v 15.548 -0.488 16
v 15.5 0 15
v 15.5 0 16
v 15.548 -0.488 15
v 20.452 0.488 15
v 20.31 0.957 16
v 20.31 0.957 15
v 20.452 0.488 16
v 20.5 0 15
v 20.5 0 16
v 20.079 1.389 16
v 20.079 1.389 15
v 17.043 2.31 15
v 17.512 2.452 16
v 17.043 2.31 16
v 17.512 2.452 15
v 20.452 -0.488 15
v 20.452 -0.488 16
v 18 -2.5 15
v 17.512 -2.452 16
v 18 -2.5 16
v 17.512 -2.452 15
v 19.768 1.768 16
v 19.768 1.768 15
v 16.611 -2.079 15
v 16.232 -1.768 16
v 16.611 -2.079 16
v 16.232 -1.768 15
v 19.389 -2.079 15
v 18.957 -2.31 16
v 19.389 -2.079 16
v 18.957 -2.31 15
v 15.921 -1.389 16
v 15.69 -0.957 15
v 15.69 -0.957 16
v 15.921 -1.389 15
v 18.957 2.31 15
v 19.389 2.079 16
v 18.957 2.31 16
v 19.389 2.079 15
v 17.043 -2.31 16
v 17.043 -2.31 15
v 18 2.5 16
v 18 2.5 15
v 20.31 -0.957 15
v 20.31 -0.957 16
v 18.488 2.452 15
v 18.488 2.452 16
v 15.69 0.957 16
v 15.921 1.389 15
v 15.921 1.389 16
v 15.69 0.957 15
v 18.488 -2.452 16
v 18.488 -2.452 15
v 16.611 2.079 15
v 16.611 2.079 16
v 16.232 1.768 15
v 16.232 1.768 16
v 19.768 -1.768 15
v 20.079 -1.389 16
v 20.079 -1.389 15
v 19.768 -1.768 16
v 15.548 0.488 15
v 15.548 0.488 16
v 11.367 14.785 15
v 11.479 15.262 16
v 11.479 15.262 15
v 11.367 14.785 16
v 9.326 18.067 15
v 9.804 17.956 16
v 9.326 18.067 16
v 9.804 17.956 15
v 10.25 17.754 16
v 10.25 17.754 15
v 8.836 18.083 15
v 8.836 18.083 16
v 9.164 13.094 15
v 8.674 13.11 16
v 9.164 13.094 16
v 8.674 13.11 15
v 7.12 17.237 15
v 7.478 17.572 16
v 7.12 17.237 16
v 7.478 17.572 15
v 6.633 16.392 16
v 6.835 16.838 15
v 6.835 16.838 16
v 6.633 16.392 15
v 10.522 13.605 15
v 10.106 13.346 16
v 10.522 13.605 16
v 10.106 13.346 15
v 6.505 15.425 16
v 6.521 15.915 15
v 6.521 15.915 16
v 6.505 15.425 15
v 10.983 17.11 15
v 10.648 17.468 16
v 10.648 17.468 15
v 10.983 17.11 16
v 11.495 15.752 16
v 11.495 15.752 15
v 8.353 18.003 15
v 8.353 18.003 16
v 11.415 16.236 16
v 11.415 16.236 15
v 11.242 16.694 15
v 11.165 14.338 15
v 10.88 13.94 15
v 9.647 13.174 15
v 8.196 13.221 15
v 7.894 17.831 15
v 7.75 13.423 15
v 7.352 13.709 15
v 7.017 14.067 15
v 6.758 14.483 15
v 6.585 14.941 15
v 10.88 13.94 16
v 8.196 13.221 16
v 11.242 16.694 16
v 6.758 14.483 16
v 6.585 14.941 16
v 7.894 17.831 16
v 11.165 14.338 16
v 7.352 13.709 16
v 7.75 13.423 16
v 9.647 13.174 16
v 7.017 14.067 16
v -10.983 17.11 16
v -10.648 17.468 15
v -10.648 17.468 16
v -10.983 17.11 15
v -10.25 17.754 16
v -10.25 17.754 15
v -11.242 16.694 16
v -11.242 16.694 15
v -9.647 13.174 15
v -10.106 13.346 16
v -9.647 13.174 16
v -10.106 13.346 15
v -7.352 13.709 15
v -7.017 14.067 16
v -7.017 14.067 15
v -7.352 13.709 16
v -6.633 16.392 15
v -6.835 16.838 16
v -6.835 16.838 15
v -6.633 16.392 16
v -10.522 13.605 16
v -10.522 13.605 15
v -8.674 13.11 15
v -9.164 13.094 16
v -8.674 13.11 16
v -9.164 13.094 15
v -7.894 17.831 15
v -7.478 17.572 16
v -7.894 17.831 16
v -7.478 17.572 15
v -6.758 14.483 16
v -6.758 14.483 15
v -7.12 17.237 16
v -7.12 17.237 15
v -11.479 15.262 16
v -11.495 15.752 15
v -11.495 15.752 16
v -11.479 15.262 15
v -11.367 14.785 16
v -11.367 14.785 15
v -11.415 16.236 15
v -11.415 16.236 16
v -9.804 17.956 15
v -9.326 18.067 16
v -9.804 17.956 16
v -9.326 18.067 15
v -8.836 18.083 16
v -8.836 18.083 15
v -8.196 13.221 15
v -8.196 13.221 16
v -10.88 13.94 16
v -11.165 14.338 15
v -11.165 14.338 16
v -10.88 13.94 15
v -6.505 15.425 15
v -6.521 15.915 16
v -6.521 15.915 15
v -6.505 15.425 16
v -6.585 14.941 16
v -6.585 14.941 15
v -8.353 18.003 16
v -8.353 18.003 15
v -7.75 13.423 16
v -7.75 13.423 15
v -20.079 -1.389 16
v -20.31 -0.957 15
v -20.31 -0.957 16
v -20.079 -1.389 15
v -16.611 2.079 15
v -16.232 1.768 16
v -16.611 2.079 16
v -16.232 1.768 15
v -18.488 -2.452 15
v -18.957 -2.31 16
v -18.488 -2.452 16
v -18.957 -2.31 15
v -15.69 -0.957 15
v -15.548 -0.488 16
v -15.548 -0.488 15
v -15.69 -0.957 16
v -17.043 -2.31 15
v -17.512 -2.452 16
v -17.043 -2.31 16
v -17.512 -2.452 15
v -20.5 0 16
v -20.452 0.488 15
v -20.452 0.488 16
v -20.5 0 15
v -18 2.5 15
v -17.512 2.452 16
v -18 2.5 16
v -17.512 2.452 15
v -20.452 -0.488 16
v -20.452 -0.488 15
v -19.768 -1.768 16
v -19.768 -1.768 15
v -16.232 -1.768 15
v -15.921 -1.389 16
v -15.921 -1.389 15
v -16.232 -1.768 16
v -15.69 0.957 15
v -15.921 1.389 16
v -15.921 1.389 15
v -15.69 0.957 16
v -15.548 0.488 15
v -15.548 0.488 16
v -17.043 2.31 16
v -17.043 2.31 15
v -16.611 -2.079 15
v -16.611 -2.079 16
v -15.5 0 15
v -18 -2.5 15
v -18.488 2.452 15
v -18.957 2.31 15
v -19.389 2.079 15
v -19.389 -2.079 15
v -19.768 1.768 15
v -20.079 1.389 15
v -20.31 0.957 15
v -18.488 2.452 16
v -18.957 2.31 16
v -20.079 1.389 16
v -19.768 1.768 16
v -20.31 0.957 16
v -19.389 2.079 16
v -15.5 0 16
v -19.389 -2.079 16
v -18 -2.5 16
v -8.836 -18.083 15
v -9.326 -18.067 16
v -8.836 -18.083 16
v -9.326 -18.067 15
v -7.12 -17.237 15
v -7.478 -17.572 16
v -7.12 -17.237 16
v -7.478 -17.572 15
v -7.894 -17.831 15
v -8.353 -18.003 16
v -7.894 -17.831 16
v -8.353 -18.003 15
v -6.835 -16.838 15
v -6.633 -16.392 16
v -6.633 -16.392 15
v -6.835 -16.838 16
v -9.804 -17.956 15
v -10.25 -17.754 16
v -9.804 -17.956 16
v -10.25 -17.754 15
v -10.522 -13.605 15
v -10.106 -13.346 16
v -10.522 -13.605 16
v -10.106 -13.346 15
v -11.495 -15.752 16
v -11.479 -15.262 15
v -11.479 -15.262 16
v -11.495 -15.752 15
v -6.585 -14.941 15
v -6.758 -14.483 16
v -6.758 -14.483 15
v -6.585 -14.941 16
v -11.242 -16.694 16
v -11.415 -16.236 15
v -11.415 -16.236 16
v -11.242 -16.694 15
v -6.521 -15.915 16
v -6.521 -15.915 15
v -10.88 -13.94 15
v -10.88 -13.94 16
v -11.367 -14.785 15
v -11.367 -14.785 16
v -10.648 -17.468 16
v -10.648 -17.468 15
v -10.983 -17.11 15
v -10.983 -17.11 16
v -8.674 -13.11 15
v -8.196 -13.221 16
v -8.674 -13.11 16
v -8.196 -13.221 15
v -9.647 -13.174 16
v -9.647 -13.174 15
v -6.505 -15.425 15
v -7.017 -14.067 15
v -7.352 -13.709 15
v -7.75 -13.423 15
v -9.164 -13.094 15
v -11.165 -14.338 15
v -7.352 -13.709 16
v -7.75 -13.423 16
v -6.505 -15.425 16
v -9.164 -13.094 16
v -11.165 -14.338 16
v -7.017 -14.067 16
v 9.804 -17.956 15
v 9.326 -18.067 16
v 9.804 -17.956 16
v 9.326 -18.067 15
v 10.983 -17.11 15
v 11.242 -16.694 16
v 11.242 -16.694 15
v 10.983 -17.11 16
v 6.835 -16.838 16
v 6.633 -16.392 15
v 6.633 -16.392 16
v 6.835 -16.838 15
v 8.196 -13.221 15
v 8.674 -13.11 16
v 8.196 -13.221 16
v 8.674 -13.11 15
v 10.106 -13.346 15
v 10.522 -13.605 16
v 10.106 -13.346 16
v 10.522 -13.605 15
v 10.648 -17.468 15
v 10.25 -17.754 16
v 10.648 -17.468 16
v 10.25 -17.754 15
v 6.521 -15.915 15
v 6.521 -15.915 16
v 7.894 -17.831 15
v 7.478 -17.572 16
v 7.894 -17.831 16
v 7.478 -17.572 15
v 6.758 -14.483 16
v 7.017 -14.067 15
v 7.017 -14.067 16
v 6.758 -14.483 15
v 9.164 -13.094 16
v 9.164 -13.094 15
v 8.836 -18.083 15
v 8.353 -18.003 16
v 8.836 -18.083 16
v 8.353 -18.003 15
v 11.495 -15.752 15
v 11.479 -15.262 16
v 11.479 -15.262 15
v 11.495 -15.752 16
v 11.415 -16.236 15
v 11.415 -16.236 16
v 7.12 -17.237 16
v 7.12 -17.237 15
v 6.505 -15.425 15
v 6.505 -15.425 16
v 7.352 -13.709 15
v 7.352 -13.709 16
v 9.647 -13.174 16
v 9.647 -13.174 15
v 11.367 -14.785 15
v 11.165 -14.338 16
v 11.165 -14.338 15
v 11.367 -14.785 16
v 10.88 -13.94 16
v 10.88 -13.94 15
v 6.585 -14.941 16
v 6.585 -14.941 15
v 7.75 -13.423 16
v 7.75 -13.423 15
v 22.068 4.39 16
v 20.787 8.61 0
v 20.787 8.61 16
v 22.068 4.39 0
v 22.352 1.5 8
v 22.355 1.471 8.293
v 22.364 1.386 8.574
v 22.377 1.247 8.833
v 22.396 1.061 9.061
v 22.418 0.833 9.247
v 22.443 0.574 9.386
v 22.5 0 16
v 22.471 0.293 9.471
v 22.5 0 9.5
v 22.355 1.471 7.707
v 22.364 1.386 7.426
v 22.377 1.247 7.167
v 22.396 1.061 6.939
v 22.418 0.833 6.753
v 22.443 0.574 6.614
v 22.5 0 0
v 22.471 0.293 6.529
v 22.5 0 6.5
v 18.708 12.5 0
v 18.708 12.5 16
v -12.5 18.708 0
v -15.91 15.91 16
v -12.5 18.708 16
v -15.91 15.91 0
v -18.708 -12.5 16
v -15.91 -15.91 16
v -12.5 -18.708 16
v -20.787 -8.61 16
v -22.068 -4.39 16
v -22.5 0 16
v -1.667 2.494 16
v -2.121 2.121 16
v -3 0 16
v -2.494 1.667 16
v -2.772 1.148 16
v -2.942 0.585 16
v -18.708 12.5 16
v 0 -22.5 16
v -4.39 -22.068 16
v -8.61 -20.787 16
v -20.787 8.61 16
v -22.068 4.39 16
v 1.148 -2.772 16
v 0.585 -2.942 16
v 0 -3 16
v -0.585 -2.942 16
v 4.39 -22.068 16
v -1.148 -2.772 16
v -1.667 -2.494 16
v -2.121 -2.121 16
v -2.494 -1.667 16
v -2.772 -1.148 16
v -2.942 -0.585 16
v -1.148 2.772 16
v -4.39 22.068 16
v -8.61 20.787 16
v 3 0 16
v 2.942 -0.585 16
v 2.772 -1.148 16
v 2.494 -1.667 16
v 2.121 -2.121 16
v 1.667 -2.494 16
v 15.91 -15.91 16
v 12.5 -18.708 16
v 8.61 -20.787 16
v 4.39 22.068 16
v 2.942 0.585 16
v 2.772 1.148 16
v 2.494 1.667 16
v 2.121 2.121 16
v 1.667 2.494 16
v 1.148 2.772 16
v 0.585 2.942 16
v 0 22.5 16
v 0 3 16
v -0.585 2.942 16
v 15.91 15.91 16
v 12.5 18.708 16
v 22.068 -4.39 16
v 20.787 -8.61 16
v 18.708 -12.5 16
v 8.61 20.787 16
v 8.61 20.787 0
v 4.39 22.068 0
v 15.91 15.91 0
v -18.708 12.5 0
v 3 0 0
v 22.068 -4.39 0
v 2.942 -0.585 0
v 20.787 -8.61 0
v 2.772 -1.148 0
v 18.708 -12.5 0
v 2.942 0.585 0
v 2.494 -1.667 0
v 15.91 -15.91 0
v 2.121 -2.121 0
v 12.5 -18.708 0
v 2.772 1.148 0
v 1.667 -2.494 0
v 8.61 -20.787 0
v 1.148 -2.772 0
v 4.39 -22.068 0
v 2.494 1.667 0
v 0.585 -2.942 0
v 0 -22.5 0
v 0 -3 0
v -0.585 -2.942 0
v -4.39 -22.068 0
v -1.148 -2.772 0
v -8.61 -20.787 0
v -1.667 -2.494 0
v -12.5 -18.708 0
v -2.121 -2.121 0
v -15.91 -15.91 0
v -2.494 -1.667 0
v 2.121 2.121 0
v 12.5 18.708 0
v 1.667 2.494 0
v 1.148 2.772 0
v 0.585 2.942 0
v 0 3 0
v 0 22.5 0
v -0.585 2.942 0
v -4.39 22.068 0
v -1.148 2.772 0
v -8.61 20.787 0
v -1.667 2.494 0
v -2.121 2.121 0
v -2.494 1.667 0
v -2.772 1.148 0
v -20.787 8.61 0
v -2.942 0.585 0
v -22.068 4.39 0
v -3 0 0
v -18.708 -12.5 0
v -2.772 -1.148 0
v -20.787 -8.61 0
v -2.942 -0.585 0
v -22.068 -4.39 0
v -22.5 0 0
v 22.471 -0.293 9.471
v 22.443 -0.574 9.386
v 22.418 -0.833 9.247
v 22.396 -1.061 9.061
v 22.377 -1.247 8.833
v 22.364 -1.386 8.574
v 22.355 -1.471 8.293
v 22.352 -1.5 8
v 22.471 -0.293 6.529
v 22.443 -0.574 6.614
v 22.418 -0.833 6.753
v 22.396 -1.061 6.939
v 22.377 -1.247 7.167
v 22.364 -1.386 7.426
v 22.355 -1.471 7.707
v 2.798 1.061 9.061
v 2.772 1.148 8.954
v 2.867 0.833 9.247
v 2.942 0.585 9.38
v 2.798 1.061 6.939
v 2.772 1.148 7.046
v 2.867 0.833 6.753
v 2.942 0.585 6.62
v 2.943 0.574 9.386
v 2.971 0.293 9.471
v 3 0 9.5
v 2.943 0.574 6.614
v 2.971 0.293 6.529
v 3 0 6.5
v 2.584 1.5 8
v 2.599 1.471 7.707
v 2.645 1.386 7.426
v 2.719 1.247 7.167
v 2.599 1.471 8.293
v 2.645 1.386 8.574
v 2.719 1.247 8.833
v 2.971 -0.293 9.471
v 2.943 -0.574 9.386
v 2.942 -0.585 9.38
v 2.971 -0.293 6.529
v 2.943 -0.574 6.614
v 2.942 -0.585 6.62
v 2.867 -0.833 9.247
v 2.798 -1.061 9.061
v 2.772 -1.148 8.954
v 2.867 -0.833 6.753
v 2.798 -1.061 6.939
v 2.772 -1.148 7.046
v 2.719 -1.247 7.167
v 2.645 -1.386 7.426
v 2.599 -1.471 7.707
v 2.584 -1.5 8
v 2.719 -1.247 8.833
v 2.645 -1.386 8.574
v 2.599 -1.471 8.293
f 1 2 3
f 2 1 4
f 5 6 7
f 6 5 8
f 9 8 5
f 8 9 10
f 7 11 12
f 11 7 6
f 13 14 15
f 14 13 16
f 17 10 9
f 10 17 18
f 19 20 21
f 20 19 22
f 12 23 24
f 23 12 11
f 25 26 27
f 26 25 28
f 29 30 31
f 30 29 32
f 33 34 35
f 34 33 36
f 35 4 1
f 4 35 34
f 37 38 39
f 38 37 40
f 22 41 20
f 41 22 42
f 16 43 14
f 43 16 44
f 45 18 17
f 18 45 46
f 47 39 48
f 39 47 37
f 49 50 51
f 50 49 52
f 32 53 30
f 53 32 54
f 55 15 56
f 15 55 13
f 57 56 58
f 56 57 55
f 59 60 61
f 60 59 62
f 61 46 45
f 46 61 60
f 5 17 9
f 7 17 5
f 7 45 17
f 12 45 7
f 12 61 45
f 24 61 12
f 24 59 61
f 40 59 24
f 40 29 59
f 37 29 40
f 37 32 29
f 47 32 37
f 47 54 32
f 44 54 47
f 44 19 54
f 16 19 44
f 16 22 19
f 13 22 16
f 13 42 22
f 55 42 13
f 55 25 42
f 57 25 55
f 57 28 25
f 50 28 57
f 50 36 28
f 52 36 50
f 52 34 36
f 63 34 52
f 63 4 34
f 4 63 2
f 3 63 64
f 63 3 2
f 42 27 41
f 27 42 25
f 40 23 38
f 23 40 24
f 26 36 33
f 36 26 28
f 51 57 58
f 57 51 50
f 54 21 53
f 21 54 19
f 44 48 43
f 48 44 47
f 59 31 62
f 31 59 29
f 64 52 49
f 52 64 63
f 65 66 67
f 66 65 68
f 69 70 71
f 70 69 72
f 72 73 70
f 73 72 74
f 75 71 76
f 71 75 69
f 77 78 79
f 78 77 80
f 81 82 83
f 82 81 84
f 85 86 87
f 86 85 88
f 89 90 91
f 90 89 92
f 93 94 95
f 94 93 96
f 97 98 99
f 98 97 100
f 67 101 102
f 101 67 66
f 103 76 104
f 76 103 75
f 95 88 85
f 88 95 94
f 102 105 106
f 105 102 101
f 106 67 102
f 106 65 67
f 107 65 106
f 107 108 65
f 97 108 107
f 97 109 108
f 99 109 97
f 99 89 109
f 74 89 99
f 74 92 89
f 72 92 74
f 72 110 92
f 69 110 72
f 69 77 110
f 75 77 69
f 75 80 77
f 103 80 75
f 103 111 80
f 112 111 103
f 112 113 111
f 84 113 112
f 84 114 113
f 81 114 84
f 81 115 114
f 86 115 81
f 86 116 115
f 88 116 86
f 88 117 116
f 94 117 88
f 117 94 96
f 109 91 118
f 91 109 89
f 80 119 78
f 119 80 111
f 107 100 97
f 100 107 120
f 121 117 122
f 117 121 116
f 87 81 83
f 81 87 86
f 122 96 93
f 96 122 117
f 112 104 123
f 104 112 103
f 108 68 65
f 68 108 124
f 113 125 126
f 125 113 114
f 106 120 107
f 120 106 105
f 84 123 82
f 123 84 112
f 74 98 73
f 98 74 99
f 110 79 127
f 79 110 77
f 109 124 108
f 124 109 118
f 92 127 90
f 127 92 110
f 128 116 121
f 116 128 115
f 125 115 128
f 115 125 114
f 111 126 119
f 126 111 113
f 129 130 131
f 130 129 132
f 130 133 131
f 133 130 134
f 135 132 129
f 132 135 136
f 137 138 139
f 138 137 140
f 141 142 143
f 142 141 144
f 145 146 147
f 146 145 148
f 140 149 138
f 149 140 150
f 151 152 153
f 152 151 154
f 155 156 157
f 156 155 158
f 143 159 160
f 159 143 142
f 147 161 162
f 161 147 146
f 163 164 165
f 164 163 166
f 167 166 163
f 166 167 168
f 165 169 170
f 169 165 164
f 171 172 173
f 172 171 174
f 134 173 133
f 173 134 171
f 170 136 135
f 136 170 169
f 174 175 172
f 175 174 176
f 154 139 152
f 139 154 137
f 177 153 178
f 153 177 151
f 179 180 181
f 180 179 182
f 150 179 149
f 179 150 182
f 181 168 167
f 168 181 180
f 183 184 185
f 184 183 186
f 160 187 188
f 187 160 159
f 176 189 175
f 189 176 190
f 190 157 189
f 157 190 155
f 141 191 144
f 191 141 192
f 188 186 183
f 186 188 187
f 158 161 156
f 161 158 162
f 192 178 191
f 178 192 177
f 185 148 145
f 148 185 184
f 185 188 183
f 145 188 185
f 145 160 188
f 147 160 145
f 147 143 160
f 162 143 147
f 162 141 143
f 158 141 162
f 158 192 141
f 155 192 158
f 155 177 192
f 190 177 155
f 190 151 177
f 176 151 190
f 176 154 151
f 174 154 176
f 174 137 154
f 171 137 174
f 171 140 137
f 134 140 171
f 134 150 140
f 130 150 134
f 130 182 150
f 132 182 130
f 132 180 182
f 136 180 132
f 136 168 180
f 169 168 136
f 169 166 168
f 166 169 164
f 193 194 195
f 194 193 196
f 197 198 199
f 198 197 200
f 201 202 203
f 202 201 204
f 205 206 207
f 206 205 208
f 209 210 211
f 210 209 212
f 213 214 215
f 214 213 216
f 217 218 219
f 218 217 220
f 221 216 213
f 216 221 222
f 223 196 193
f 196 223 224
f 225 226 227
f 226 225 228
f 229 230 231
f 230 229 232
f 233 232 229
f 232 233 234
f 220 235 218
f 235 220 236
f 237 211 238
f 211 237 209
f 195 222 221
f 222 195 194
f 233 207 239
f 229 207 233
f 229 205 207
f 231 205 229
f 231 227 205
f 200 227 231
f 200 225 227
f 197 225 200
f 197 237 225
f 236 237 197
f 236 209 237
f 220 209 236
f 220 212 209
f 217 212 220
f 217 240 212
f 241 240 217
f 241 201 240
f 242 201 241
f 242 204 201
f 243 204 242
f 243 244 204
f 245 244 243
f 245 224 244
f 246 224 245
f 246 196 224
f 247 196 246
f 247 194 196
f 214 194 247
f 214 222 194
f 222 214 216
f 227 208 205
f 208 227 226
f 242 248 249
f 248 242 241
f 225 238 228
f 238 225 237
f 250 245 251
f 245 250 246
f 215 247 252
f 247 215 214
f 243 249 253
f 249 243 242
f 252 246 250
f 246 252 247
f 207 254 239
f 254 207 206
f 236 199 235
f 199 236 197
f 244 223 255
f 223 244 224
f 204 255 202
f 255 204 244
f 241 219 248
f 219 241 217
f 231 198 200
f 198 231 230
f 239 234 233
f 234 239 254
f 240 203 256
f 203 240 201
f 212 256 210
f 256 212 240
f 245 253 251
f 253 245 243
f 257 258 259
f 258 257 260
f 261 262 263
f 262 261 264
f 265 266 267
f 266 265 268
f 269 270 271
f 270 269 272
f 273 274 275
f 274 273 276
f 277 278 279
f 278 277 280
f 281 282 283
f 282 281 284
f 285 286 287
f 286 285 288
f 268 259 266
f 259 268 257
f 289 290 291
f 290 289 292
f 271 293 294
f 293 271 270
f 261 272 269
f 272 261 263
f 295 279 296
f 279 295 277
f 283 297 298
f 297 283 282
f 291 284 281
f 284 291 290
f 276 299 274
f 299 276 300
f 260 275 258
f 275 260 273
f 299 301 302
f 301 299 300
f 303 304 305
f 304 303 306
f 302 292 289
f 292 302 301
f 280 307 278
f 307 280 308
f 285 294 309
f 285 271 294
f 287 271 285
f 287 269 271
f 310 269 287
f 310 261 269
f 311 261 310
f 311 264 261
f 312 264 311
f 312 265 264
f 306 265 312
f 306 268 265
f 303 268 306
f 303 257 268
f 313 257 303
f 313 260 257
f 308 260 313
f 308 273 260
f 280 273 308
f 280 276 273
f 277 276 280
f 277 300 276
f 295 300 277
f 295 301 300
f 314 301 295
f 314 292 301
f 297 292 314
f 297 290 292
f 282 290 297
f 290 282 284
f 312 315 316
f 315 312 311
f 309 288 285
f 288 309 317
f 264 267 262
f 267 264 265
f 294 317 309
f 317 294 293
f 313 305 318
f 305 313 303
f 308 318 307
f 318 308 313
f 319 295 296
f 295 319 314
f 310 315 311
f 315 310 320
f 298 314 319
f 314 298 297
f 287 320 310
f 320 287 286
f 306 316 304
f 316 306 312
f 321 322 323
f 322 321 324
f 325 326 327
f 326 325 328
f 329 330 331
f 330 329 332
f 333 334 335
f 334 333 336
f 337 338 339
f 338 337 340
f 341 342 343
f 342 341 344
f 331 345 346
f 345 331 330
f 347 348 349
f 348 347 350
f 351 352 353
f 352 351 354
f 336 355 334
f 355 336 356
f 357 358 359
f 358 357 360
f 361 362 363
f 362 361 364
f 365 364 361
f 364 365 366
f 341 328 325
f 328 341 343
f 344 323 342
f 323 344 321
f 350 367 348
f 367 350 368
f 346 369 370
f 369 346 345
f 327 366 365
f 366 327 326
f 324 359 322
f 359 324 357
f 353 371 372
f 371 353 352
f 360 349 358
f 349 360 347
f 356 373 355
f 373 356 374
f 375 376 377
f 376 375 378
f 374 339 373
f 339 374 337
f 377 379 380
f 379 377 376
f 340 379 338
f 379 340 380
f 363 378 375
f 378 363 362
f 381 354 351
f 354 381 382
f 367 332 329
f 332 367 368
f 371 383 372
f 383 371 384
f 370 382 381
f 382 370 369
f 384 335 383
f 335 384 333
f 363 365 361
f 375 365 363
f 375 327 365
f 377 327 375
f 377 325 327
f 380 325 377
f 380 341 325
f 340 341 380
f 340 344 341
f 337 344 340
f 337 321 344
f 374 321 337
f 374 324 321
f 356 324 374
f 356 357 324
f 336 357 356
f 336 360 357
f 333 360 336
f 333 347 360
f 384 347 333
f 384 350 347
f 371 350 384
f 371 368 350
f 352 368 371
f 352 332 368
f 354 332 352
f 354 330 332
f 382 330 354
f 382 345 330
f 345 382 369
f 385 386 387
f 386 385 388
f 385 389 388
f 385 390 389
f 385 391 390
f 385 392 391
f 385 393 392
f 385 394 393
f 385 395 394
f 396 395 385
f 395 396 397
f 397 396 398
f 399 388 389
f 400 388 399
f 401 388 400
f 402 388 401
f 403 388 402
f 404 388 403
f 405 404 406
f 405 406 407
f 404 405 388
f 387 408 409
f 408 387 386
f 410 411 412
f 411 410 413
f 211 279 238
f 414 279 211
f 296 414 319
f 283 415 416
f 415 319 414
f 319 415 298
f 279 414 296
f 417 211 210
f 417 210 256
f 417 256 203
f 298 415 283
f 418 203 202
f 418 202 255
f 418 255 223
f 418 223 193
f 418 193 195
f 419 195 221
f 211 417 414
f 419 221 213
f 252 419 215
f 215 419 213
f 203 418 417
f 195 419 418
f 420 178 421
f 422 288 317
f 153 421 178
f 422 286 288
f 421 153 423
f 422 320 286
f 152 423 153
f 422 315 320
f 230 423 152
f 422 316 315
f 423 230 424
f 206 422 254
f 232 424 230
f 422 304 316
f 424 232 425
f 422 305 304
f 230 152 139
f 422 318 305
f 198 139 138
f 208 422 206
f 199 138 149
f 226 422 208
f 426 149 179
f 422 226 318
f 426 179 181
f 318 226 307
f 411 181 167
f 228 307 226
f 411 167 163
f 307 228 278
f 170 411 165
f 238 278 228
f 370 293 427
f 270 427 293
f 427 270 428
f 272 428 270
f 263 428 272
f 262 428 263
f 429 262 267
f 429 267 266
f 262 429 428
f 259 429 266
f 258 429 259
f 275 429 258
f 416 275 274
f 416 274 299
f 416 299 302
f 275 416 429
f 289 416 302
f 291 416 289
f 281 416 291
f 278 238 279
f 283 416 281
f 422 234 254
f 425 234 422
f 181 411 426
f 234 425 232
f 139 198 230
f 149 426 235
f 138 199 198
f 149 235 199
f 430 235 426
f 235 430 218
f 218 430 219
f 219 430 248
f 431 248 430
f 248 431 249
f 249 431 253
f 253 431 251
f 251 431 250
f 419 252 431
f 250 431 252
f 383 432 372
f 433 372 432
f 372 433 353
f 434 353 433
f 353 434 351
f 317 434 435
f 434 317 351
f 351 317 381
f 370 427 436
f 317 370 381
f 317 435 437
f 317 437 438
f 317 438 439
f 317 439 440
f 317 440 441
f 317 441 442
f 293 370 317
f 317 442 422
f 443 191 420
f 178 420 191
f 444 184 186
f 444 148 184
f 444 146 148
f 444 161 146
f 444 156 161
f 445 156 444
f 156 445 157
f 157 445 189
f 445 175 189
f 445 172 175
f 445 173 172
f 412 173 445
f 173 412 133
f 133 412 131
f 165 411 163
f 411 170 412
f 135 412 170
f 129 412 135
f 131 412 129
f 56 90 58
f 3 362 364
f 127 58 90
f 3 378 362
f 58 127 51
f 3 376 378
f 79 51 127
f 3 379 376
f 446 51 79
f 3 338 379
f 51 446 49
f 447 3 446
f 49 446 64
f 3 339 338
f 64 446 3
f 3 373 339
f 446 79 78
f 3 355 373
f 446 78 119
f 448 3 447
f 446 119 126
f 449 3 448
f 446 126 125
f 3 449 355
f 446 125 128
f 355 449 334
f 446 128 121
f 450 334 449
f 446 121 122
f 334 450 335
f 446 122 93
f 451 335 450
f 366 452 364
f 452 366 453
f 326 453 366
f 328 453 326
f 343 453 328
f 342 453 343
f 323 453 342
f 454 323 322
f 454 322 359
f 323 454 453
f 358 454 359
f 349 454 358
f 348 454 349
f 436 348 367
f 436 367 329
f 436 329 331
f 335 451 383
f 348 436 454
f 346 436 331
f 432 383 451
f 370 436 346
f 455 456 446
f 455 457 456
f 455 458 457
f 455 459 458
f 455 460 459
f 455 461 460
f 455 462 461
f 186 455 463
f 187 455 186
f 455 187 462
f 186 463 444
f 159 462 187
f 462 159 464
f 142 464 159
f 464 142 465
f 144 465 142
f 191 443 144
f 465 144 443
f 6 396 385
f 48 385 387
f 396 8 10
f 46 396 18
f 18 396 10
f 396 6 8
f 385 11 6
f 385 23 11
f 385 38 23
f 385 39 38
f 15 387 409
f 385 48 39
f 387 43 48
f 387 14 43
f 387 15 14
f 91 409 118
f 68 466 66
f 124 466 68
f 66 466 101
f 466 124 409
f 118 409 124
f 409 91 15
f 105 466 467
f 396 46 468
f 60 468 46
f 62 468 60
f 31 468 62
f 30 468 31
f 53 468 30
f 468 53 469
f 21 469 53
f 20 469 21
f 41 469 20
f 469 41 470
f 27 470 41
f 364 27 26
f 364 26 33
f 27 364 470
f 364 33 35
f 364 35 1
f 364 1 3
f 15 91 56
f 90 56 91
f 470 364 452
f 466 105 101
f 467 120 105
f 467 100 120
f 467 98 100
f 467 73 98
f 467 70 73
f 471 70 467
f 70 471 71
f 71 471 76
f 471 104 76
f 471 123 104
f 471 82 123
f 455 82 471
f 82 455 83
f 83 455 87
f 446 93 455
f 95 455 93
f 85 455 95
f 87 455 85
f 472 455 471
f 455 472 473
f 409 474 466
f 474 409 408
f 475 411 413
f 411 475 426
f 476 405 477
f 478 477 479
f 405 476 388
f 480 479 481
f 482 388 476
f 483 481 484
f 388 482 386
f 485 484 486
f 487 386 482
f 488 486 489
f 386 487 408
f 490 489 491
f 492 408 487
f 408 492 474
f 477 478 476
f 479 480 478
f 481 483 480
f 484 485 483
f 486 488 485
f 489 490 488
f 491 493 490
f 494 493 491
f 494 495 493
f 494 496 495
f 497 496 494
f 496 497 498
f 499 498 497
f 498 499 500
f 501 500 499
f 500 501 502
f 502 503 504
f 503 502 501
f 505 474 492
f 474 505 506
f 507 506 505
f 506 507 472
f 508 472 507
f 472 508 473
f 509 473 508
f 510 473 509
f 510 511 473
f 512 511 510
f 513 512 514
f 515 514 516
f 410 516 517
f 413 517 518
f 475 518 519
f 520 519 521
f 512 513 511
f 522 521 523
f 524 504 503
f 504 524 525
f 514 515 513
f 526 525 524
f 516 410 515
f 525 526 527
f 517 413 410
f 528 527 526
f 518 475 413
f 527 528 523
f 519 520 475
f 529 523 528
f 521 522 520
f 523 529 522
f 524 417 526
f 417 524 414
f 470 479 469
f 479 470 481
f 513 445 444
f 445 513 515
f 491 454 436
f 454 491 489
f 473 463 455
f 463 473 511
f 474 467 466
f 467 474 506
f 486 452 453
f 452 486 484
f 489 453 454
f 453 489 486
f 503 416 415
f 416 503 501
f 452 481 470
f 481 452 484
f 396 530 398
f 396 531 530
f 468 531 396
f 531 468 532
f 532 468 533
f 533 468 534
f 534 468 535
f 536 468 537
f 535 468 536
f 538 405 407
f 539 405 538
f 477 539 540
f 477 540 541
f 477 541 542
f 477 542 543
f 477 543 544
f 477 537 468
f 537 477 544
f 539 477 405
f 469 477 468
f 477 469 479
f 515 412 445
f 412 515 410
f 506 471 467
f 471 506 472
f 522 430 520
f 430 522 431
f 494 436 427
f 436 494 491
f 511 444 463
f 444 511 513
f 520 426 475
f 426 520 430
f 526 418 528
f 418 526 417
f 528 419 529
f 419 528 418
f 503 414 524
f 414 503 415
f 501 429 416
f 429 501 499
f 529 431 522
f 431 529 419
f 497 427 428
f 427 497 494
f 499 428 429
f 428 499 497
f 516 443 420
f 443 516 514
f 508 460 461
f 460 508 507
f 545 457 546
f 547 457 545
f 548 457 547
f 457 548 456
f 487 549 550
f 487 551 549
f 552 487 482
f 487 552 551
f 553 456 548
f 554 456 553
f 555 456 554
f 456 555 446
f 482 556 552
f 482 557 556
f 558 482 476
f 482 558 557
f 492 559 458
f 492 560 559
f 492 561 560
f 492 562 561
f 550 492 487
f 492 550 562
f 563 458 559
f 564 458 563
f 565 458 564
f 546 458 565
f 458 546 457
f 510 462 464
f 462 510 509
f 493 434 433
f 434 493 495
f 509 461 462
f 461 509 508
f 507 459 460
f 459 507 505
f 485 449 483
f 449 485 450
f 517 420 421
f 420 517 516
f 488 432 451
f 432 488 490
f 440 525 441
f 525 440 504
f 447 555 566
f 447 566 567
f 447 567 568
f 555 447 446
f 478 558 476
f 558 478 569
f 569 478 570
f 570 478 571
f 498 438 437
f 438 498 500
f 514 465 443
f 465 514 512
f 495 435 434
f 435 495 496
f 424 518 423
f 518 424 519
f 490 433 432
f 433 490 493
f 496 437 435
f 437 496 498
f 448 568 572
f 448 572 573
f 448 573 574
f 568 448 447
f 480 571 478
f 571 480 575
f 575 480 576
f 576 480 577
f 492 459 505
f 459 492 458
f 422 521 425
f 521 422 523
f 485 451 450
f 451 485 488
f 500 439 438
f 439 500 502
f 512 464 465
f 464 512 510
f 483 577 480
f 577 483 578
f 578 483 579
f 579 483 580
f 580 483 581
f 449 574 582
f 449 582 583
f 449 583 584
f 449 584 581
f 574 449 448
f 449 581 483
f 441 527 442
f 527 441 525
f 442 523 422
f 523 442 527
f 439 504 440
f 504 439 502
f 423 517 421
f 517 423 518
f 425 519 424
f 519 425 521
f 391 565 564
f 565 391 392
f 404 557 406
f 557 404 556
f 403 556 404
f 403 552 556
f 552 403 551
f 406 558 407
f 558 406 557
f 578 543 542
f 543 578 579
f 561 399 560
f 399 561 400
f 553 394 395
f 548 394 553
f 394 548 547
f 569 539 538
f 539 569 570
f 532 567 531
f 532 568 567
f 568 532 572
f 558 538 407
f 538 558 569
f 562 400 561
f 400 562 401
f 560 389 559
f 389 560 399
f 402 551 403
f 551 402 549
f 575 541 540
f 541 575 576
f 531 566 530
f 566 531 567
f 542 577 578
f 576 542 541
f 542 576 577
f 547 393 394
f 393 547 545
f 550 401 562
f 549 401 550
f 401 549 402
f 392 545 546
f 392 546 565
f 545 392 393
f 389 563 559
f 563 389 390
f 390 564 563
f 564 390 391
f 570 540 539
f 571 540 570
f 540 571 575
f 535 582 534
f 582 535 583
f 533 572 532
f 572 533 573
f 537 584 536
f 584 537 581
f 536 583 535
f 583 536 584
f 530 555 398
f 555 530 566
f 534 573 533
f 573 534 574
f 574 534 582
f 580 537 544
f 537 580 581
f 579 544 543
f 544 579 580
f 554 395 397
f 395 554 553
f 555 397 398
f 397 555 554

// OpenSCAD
$fn = 32;

// ----------------------------------------------------------------------
// Control knob: dimpled knob
// ----------------------------------------------------------------------

// --- parameters (mm) ---
dimp_d = 5;               // finger dimple diameter
n_dimp = 6;               // number of dimples
dimp_r = 18;              // dimple ring radius
knob_d = 45;              // knob body diameter
knob_h = 16;              // knob body height
bore_d = 6;               // shaft bore diameter
set_d = 3;                // set screw bore diameter

dimp_step = 360 / n_dimp;  // dimple angular step

difference() {
  cylinder(h = knob_h, d = knob_d);
  translate([0, 0, -1]) cylinder(h = knob_h + 2, d = bore_d);
  translate([-1, 0, knob_h / 2]) rotate([0, 90, 0])
    cylinder(h = knob_d / 2 + bore_d / 2 + 2, d = set_d);  for (i = [0 : n_dimp - 1])
    rotate([0, 0, i * dimp_step])
      translate([dimp_r, 0, knob_h - 1])
        cylinder(h = 2, d = dimp_d);
}
